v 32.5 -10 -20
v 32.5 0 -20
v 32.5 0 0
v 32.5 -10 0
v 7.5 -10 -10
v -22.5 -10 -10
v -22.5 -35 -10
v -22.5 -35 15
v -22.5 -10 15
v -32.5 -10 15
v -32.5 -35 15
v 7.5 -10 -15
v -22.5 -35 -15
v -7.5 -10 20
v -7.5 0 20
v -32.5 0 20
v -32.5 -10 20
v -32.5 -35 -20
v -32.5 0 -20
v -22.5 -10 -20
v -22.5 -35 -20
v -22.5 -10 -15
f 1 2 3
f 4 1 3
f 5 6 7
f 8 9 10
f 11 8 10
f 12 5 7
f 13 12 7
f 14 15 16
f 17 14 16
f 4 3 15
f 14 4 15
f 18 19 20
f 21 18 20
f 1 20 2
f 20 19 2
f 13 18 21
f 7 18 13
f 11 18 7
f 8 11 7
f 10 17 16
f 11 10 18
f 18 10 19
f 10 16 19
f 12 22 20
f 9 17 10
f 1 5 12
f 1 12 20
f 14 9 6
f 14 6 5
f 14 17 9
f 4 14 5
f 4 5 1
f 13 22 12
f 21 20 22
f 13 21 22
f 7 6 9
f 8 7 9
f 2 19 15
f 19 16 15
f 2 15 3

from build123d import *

# Parameters (mm, degrees)
F1_DEPTH = 10
F0_W     = 30
F0_H     = 5
F2_DEPTH = 35
F4_DEPTH = 10.001


with BuildPart() as f1:
    # F0 (on Front) → F1 (new body)
    with BuildSketch(Plane.XZ):
        Polygon((32.5, 0), (-7.5, 20), (-32.5, 20), (-32.5, 15), (-22.5, 15), (-22.5, -10), (7.5, -10), (7.5, -15), (-22.5, -15), (-22.5, -20), (32.5, -20), align=None)
    extrude(amount=F1_DEPTH)

    # F0 (on Front) → F2 (join)
    with BuildSketch(Plane.XZ):
        Polygon((-22.5, 15), (-32.5, 15), (-32.5, -20), (-22.5, -20), (-22.5, -15), (-22.5, -10), align=None)
        with Locations((-7.5, -12.5)):
            Rectangle(F0_W, F0_H)
    extrude(amount=F2_DEPTH)

    # F3 (on face) → F4 (cut, through all)
    with BuildSketch(Plane.XY.offset(-10)):
        Polygon((7.5, -10), (-22.5, -35), (7.5, -35), align=None)
    extrude(amount=-F4_DEPTH, mode=Mode.SUBTRACT)


solid = f1.part
